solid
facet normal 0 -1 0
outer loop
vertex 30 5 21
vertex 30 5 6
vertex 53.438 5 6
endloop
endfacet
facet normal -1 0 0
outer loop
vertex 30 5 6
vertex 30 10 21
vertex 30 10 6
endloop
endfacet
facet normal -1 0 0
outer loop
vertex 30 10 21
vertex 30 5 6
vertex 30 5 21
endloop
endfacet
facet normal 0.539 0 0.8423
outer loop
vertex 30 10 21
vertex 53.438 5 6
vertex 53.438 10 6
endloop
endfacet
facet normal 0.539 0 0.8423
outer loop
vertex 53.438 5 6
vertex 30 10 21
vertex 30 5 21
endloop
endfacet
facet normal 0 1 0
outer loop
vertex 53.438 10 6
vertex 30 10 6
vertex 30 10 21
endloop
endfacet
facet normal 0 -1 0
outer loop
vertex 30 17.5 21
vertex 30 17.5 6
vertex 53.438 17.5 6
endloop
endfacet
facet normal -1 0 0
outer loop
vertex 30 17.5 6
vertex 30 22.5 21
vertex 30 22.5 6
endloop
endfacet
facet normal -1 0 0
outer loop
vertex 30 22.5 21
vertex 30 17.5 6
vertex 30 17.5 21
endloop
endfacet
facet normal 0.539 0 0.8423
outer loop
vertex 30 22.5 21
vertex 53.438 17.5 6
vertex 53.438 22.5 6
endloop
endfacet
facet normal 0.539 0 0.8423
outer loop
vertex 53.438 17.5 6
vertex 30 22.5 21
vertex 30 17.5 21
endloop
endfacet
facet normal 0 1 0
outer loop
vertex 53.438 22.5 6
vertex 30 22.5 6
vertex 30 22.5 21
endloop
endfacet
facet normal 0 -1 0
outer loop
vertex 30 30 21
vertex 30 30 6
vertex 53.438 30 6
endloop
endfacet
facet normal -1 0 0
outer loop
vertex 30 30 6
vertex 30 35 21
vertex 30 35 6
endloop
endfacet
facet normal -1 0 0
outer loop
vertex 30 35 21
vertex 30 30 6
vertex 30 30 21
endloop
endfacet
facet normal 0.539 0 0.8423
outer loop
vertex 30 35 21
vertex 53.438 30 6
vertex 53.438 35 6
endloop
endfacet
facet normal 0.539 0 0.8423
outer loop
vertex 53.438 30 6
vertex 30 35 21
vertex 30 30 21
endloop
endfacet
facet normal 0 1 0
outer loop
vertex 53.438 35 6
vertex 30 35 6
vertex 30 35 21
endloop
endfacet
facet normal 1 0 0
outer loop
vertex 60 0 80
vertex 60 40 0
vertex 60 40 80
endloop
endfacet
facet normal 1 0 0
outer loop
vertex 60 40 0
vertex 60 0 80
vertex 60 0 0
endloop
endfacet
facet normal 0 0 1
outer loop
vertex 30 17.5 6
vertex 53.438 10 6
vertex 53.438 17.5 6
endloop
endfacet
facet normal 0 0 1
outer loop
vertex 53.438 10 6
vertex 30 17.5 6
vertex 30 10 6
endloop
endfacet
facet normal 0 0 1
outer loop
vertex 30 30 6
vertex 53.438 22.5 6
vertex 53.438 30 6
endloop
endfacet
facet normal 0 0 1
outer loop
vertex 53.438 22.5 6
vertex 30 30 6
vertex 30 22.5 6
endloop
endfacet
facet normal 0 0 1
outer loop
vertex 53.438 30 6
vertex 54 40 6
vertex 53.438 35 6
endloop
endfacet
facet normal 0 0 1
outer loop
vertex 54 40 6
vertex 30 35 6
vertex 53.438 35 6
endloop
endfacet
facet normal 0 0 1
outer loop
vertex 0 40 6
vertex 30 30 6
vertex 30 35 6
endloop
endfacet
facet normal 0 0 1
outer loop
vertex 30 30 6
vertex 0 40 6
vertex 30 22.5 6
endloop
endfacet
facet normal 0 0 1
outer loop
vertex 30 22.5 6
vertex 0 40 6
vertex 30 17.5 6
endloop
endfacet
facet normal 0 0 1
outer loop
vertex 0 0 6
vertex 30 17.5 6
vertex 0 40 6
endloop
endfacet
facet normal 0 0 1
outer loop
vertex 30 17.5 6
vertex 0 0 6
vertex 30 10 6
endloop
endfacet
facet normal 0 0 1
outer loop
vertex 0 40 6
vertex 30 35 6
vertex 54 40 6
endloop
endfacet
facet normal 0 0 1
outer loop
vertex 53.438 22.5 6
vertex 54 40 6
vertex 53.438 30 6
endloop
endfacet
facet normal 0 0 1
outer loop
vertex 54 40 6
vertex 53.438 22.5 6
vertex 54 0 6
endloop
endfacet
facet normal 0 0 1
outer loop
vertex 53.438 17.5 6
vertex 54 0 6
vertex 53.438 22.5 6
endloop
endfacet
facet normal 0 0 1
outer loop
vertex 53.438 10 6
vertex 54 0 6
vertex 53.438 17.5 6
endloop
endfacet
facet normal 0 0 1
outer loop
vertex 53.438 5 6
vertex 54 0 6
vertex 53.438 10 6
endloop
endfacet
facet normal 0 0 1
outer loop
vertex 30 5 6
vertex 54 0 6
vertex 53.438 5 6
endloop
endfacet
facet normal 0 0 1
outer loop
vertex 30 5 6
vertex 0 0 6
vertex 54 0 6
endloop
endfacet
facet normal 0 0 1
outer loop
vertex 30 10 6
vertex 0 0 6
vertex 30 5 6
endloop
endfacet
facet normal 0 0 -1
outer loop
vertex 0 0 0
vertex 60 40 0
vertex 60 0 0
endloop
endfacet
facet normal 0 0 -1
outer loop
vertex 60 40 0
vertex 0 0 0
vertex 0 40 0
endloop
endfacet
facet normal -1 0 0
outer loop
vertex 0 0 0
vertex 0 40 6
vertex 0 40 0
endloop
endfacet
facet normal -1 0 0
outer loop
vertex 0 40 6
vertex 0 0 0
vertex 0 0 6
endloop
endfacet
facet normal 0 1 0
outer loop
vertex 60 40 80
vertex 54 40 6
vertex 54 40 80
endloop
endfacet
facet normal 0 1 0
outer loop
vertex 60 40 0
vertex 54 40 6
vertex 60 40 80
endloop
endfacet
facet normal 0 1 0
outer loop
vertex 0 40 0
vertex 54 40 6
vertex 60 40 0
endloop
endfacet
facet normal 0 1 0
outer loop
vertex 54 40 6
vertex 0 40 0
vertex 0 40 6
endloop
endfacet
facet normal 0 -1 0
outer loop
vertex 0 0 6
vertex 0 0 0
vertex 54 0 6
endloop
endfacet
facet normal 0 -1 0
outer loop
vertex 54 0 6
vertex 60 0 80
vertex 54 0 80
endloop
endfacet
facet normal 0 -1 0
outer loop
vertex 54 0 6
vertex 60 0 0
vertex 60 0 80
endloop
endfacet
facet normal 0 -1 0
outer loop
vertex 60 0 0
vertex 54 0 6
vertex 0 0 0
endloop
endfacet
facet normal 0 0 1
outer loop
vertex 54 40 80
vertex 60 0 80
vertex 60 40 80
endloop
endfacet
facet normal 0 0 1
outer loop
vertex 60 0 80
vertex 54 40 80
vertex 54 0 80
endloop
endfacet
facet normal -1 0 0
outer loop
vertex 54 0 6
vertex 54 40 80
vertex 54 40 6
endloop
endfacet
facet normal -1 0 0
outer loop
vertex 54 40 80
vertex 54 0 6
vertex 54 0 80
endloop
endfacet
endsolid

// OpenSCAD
$fn = 32;

// ----------------------------------------------------------------------
// Rib bracket: 3-gusset L bracket
// ----------------------------------------------------------------------

// --- parameters (mm) ---
base_l = 60;              // foot length, X
base_w = 40;              // foot width, Y
base_t = 6;               // foot thickness
plate_t = 6;              // upright plate thickness
plate_h = 80;             // overall height
gus_l = 24;               // gusset leg along the foot
gus_h = 16;               // gusset height
gus_t = 5;                // gusset thickness
gus_edge = 5;             // gusset margin from the foot edge
n_gus = 3;                // gusset count
fit_tol = 0.05;           // tolerance for press fits, mm
free_tol = 0.3;           // tolerance for clearance fits, mm

gus_pitch = (base_w - 2 * gus_edge - gus_t) / (n_gus - 1);  // gusset pitch

union() {
  cube([base_l, base_w, base_t]);
  translate([base_l - plate_t, 0, base_t - 1])
    cube([plate_t, base_w, plate_h - base_t + 1]);
  for (i = [0 : n_gus - 1])
    translate([base_l - plate_t - gus_l, gus_edge + i * gus_pitch, base_t - 1])
      rotate([-90, 0, 0])
        linear_extrude(height = gus_t)
          polygon(points = [[0, 0], [gus_l + 1, 0], [0, -gus_h]]);
}
